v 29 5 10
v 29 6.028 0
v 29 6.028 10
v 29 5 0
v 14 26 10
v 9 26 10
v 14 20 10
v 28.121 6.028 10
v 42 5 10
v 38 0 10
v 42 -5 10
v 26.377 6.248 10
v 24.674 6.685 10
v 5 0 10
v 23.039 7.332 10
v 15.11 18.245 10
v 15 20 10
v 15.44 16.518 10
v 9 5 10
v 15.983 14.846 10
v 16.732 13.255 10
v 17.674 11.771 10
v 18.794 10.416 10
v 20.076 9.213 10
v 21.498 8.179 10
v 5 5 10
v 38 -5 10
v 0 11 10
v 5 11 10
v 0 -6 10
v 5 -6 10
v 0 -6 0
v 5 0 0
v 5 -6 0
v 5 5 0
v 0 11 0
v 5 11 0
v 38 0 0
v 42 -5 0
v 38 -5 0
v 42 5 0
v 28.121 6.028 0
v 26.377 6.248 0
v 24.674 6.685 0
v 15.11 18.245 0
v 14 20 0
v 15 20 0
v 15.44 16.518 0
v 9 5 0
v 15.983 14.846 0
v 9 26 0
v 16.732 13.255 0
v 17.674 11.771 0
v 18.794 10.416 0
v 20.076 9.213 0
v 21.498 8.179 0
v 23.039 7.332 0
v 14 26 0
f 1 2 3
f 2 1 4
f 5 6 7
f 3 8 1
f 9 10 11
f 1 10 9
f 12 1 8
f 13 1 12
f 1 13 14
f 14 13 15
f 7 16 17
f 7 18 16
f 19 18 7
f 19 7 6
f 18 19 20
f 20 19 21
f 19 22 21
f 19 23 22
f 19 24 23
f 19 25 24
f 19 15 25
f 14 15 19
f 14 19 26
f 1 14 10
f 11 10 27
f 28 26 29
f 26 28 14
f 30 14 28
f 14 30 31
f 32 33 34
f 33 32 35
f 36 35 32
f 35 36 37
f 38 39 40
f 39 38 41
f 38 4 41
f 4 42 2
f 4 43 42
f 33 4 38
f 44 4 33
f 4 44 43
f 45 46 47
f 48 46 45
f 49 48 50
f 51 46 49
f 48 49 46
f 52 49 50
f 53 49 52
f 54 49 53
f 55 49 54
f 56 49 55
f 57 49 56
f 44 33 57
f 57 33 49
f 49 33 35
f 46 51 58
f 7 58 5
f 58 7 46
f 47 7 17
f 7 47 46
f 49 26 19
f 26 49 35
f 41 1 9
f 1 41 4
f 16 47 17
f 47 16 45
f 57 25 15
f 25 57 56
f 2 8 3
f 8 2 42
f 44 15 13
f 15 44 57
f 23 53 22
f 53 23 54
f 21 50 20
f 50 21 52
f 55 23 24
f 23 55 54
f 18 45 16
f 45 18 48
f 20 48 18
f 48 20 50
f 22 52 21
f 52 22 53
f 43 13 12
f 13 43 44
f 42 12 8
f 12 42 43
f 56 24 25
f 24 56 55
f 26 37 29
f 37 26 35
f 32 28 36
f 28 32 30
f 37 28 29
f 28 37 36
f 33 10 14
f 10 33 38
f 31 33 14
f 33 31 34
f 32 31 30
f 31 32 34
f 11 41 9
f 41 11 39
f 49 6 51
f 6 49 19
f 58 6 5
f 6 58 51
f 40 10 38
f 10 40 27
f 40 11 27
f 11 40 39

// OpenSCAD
height = 6;
innerHeight = 5;
width = 10;
innerLength = 5;
rimLength = 4;
lengthHolder = 30;
HolderHeight = 5;
rimHolderHeight = 5;
rimHolderLength = 3;

footHeight = 20;
footLength = 5;


union(){
    cube([innerLength, height + innerHeight, width]);
    mirror([0, 1, 0]) cube([innerLength, height, width]);

    translate([innerLength, 0, 0]) {
        cube([rimLength + lengthHolder + rimHolderLength, HolderHeight, width]);
    }

    translate([innerLength + rimLength, HolderHeight, 0]) {
        cube([footLength, footHeight + (height - HolderHeight), width]);
    }

    translate([lengthHolder + innerLength + rimLength - 1, -1 * rimHolderHeight, 0]) {
        cube([rimLength, rimHolderHeight, width]);
    }

    translate([innerLength + rimLength + footLength, HolderHeight, 0]) {
        difference() {
            cube([footHeight - 5, footHeight - 5, width]);
            translate([footHeight - 5, footHeight - 5, 0]) cylinder(r=footHeight - 6, h=width, $fn= 50);
        }
    }
}
